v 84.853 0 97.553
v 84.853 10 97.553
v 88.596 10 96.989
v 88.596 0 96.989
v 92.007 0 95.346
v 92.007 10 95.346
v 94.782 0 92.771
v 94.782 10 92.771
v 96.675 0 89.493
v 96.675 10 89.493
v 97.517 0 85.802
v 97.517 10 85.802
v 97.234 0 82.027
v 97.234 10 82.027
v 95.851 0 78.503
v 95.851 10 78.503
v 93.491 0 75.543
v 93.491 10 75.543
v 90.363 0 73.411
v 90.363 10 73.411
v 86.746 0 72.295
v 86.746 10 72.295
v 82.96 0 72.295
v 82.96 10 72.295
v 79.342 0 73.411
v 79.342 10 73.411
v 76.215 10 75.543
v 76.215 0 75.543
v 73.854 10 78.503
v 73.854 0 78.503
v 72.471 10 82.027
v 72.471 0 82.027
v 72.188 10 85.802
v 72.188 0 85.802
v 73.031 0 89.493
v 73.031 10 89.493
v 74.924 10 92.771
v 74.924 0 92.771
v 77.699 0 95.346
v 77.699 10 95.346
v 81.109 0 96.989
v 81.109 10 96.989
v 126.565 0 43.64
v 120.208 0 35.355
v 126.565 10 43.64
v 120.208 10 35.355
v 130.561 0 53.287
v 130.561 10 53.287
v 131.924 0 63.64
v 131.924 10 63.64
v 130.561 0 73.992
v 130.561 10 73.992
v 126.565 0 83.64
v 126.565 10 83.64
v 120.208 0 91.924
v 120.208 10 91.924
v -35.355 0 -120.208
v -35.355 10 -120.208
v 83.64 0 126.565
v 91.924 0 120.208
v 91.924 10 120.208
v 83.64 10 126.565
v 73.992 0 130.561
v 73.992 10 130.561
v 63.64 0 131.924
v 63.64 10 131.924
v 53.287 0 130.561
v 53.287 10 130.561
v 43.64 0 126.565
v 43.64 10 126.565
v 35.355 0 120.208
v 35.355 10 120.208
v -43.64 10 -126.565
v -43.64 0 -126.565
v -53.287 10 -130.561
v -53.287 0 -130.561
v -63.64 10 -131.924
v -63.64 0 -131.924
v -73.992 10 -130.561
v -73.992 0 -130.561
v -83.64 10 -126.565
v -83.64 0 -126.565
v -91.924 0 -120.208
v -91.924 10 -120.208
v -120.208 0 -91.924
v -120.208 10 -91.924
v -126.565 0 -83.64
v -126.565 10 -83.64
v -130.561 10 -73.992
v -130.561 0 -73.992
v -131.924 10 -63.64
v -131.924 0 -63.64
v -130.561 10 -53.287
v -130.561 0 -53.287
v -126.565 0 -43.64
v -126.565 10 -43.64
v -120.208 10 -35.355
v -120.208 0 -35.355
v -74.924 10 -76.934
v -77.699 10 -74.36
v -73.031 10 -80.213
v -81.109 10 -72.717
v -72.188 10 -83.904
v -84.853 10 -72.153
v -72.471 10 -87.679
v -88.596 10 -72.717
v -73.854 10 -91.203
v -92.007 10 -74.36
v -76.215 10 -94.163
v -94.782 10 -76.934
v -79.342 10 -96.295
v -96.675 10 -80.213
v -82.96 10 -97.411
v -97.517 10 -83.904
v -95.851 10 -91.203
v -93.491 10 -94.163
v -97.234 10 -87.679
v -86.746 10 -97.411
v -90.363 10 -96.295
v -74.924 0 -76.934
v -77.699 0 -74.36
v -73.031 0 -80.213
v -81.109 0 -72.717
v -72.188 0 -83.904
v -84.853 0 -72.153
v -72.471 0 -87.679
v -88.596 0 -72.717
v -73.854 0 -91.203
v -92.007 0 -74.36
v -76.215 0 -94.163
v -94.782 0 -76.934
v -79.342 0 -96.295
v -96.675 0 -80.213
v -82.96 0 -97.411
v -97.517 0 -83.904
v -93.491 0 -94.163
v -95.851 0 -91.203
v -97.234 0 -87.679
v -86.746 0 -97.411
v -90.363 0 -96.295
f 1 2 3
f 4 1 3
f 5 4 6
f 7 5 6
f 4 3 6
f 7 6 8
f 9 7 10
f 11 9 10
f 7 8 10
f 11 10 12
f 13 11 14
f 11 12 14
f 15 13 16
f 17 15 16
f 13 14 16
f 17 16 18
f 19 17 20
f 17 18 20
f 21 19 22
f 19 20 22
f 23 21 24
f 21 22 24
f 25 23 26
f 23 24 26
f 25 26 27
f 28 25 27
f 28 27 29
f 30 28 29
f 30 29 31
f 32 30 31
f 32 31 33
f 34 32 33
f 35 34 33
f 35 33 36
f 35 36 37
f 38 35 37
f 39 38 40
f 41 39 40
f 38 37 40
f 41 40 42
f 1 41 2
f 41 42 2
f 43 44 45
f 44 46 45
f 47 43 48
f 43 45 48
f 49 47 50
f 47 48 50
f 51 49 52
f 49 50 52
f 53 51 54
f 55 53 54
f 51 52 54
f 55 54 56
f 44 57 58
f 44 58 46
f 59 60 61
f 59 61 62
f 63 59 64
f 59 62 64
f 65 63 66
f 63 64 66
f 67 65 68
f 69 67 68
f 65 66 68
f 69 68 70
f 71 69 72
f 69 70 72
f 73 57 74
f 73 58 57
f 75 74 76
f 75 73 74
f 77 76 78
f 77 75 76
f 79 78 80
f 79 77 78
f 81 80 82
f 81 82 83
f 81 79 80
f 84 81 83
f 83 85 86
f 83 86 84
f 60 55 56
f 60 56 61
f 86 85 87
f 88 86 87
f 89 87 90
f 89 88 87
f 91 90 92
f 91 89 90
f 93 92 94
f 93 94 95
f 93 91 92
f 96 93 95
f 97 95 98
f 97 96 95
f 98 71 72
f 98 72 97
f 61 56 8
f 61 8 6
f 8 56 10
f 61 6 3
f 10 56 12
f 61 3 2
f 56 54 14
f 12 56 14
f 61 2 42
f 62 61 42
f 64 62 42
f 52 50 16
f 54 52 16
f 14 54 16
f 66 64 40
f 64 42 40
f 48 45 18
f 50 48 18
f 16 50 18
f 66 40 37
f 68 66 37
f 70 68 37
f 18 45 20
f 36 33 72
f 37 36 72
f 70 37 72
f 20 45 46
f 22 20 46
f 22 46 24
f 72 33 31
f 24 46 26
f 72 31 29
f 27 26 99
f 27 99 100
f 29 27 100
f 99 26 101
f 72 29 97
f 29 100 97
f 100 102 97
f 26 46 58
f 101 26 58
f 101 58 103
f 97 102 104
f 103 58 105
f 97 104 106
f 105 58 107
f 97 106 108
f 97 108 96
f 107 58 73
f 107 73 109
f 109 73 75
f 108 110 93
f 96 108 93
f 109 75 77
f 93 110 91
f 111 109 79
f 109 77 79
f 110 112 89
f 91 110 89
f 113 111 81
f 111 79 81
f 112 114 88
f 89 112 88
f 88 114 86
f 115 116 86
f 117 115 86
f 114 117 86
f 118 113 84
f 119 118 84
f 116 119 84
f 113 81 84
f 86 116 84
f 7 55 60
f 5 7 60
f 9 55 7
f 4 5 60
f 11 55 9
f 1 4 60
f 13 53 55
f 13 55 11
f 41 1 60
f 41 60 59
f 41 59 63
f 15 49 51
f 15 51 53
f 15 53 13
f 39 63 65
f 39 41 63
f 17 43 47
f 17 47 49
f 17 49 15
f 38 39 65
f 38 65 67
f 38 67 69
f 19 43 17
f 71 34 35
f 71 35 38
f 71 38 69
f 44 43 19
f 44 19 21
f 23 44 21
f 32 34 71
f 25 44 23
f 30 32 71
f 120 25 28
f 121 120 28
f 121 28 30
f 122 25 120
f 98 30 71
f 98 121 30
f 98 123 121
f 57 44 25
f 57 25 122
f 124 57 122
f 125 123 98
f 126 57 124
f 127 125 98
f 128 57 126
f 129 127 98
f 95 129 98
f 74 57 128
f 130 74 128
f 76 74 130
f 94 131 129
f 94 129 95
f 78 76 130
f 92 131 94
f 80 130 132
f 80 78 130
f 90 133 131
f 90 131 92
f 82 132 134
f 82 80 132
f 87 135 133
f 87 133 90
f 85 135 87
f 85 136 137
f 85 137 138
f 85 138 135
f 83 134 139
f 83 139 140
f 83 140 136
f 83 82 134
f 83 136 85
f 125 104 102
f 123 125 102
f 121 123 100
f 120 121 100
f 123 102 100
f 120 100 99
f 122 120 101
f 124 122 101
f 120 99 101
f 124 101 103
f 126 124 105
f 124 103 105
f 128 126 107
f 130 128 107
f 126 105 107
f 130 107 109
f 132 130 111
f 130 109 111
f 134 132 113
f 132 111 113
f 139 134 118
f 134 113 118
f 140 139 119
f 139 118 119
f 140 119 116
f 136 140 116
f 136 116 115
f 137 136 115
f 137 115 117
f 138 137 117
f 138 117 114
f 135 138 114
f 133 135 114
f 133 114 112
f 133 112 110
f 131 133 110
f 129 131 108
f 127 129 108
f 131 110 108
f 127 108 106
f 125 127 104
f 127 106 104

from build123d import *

# Parameters (mm, degrees)
BOSS_EXTRUDE1_DEPTH = 10
SKETCH2_R           = 12.7
CUT_EXTRUDE1_DEPTH  = 10
FILLET1_R           = 40


with BuildPart() as part:
    # Sketch1 → Boss-Extrude1 (new body)
    with BuildSketch(Plane(origin=(0, 0, 0), x_dir=(1, 0, 0), z_dir=(0, 1, 0))):
        Polygon((-63.639610307, 148.492424049), (148.492424049, -63.639610307), (63.639610307, -148.492424049), (-148.492424049, 63.639610307), align=None)
    extrude(amount=BOSS_EXTRUDE1_DEPTH)

    # Sketch2 → Cut-Extrude1 (cut)
    with BuildSketch(Plane(origin=(0, 10, 0), x_dir=(1, 0, 0), z_dir=(0, 1, 0))):
        with Locations(Location((-84.852813742, 84.852813742, 0), (0, 0, 270))):
            Circle(SKETCH2_R)
        with Locations(Location((84.852813742, -84.852813742, 0), (0, 0, 270))):
            Circle(SKETCH2_R)
    extrude(amount=-CUT_EXTRUDE1_DEPTH, mode=Mode.SUBTRACT)

    # Fillet1
    fillet1_edges = [part.edges().sort_by_distance(p)[0] for p in [
        (148.492424049, 5, 63.639610307),
        (63.639610307, 5, 148.492424049),
        (-148.492424049, 5, -63.639610307),
        (-63.639610307, 5, -148.492424049),
    ]]
    fillet(fillet1_edges, radius=FILLET1_R)


solid = part.part
